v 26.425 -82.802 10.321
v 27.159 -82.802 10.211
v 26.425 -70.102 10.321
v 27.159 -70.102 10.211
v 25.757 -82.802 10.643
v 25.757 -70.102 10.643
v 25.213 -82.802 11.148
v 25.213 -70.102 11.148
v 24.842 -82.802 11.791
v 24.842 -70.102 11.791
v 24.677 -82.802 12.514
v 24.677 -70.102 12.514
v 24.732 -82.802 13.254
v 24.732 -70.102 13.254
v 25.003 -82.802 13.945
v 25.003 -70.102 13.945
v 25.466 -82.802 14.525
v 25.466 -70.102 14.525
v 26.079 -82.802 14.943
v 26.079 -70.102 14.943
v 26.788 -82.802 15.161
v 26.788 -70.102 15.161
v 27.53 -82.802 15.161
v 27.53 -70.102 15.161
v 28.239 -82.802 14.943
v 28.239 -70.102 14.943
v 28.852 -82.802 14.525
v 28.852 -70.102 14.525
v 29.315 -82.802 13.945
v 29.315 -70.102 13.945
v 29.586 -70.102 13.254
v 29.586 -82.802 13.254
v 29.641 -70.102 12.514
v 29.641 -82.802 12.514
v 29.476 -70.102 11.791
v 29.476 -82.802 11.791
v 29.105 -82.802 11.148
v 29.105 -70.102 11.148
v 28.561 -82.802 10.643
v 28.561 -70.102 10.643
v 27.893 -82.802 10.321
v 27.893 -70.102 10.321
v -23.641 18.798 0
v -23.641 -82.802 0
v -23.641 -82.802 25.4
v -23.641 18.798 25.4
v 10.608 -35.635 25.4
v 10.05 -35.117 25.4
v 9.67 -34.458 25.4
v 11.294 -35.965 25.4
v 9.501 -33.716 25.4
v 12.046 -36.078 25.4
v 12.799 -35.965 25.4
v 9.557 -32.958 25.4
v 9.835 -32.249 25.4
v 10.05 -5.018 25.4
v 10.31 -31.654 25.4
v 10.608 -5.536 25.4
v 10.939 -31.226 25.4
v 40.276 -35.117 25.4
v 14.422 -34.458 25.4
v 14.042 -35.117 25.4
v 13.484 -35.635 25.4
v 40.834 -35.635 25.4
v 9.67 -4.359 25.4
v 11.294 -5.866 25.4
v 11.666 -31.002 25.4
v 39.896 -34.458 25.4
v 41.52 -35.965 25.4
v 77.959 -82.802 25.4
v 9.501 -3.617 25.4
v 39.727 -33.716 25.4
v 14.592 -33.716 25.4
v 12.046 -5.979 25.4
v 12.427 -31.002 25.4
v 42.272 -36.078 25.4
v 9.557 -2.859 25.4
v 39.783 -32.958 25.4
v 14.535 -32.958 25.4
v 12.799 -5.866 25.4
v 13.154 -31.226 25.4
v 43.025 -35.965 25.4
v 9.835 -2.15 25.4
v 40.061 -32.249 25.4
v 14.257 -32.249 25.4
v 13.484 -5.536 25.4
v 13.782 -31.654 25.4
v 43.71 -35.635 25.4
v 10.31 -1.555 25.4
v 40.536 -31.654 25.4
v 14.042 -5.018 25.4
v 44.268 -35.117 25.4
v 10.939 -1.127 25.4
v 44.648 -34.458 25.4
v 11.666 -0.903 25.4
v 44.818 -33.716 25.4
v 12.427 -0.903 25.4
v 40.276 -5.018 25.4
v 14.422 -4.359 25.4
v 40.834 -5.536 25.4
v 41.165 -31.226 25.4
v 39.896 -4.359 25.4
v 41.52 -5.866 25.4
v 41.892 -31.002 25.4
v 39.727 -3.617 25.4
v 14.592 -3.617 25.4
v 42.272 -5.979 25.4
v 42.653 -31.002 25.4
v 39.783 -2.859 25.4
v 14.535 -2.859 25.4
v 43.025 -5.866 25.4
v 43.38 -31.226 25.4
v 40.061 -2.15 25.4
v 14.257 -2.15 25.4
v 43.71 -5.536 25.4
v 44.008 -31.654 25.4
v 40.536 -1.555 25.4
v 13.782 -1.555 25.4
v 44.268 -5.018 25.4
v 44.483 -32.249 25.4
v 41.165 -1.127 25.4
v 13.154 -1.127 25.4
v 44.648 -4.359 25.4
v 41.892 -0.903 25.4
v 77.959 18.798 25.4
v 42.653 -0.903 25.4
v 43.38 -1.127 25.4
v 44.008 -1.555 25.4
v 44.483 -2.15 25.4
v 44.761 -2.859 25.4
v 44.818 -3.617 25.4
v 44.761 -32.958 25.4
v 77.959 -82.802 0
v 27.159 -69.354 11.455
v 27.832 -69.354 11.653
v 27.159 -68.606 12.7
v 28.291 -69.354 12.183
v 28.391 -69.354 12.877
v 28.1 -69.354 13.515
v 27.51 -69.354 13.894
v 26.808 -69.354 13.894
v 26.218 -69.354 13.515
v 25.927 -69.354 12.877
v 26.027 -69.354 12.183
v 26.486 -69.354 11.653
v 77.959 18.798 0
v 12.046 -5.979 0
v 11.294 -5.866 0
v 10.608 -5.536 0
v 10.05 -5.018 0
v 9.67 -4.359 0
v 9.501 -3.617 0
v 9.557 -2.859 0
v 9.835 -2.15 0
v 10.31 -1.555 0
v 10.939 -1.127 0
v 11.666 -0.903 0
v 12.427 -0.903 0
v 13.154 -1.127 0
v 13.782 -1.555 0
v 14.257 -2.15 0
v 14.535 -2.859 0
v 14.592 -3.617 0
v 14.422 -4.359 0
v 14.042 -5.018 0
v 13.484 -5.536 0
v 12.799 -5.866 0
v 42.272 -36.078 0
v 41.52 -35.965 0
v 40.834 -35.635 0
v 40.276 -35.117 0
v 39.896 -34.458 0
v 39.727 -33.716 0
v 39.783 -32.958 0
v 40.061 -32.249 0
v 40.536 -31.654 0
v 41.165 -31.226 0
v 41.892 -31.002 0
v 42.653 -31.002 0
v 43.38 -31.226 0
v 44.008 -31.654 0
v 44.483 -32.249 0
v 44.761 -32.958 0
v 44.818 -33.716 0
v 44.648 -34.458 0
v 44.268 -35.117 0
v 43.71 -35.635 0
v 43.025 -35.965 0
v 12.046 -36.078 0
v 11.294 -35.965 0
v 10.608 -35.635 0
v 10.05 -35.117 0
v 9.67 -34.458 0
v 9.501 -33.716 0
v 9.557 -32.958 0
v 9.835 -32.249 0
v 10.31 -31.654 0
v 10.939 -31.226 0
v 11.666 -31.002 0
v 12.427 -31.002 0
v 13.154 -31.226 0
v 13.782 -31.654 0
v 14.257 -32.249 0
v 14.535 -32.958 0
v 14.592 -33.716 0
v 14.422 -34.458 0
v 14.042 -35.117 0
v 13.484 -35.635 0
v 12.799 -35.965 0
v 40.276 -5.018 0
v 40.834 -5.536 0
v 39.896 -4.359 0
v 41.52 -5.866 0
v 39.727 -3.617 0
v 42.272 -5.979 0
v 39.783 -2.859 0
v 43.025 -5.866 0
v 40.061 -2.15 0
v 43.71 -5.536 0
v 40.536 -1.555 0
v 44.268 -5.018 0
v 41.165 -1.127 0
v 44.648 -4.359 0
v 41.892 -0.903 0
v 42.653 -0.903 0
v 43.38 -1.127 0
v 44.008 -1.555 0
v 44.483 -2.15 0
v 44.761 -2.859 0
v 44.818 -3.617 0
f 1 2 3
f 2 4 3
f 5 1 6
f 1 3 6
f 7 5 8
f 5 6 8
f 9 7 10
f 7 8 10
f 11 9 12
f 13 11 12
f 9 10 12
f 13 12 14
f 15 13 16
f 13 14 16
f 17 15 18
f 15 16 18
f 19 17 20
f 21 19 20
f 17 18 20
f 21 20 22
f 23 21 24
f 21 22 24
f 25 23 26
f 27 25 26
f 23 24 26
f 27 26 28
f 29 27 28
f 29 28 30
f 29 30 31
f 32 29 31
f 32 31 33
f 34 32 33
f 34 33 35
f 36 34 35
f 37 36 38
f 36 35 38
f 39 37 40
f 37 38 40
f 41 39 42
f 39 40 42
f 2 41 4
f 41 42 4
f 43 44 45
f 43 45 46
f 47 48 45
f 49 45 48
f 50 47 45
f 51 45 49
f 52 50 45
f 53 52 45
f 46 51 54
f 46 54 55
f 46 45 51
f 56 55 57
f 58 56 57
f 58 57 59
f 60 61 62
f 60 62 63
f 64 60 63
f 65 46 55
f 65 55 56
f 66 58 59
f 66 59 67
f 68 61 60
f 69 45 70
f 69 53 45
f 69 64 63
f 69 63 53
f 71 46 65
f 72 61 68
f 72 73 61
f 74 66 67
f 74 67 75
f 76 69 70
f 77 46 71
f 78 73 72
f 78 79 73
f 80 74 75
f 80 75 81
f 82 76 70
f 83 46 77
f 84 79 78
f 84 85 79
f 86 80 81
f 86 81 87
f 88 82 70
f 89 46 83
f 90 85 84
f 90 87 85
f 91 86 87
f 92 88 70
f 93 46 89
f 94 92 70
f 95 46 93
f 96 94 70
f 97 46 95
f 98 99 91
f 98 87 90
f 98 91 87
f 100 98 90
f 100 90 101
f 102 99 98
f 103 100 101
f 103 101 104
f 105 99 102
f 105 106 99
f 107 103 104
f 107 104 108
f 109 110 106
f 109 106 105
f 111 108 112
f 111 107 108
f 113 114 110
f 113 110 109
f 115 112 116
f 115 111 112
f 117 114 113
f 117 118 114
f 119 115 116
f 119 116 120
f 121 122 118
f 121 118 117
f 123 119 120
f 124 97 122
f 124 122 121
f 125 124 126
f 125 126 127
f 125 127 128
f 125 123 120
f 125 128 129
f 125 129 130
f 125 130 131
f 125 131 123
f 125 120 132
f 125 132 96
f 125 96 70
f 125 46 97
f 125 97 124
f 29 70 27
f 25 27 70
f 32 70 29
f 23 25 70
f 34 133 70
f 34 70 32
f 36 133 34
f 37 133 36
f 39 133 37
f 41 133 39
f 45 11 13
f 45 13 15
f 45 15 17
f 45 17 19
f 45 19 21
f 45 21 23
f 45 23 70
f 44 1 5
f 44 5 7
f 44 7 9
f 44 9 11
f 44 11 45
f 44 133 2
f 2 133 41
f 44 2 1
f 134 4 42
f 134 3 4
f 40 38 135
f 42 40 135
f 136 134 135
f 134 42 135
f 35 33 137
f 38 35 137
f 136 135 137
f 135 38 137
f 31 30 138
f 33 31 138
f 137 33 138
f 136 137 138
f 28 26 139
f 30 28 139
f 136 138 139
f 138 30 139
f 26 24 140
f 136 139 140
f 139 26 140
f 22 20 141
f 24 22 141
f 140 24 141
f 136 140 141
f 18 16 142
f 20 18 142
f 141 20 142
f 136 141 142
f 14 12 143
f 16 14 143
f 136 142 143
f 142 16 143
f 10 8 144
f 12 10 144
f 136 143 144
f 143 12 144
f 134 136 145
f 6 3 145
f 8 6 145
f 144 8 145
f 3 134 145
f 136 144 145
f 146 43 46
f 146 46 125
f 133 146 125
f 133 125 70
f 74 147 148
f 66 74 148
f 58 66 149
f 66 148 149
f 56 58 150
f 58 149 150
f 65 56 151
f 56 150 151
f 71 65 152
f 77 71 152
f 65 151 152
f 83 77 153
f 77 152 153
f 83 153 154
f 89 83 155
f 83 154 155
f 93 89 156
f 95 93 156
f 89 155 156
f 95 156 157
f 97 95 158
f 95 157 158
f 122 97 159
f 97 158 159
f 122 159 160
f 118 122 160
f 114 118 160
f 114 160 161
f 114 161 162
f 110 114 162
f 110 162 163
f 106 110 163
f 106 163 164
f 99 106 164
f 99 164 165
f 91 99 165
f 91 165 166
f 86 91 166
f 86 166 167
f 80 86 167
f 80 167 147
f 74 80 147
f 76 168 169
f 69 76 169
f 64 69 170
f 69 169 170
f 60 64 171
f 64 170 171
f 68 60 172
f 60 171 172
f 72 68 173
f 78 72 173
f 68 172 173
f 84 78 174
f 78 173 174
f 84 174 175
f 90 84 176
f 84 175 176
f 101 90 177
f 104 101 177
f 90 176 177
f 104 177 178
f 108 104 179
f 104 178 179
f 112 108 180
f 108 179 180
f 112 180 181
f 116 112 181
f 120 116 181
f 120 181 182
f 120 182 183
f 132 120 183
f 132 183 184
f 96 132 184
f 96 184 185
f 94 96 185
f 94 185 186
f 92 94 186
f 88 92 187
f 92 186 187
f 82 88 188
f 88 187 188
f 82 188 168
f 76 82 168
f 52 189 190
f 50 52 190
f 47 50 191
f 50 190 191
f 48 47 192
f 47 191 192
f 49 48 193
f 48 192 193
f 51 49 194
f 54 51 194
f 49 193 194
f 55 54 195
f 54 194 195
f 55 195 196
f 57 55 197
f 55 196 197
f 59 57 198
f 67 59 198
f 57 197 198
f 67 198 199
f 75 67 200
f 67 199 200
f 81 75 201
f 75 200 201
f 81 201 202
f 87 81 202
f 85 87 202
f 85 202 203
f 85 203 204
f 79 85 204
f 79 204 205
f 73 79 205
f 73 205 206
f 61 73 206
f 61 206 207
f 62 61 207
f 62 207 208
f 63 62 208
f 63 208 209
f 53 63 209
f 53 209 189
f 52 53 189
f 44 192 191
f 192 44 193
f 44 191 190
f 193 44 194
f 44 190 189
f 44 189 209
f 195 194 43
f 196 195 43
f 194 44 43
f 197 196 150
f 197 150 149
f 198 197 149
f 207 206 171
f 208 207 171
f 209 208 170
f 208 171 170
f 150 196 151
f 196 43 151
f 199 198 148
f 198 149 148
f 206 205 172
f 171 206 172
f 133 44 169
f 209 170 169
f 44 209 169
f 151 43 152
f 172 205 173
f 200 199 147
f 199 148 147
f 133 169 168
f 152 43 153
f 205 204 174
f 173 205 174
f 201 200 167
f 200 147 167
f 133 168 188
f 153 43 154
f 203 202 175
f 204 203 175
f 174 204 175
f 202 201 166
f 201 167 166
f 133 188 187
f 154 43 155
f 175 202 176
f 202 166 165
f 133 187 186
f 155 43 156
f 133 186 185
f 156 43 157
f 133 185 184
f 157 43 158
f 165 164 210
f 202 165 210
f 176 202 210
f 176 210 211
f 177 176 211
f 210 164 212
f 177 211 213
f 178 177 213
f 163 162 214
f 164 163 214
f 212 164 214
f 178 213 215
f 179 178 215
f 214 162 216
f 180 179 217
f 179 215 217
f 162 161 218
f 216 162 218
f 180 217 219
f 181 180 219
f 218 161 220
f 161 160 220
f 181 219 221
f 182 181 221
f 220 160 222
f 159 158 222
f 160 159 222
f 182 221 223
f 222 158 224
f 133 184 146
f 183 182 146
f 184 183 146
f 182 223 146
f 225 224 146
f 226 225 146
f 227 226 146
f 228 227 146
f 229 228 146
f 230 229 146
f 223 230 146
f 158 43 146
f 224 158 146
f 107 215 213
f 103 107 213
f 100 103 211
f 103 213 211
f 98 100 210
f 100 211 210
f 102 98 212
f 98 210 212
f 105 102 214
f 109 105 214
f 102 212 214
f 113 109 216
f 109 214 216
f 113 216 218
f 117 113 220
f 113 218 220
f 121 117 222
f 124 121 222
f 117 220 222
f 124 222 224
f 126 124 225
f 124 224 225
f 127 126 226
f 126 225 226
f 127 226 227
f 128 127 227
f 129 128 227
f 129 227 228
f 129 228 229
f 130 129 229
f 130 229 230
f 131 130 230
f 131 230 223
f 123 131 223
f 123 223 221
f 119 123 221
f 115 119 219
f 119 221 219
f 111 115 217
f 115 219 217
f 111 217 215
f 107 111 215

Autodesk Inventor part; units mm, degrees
ref_plane "YZ Plane" through (0, 0, 0) normal (1, 0, 0) x (0, 1, 0)
ref_plane "XZ Plane" through (0, 0, 0) normal (0, 1, 0) x (-1, 0, 0)
ref_plane "XY Plane" through (0, 0, 0) normal (0, 0, 1) x (1, 0, 0)
sketch "Sketch1" plane through (0, 0, 0) normal (0, 0, 1) x (1, 0, 0)
  line L0 (-23.6409, 18.7983) -> (77.9591, 18.7983)
  line L1 (77.9591, 18.7983) -> (77.9591, -82.8017)
  line L2 (77.9591, -82.8017) -> (-23.6409, -82.8017)
  line L3 (-23.6409, -82.8017) -> (-23.6409, 18.7983)
  point P0 (0, 0)
  dimension "d0" = 101.6
  dimension "d1" = 101.6
extrude "Extrusion1" add sketch "Sketch1" along normal blind 25.4
sketch "Sketch2" plane through (0, 0, 25.4) normal (0, 0, 1) x (1, 0, 0)
  line L0 (-23.6409, 18.7983) -> (77.9591, 18.7983) projected
  line L1 (27.1591, 18.7983) -> (52.8131, 18.7983)
  line L2 (27.1591, 18.7983) -> (1.5051, 18.7983)
  line L3 (1.5051, 18.7983) -> (12.0461, 18.7983)
  line L4 (52.8131, 18.7983) -> (42.2721, 18.7983)
  line L5 (12.0461, 18.7983) -> (12.0461, -3.4267)
  line L6 (12.0461, 18.7983) -> (12.0461, -33.5257)
  line L7 (42.2721, 18.7983) -> (42.2721, -3.4267)
  line L8 (42.2721, -3.4267) -> (42.2721, -33.5257)
  point P0 (0, 0)
  dimension "d4" = 25.654
  dimension "d5" = 25.654
  dimension "d6" = 10.541
  dimension "d7" = 10.541
  dimension "d8" = 22.225
  dimension "d9" = 52.324
hole "Hole1" at (12.0461, -3.4267, 25.4) at (42.2721, -3.4267, 25.4) at (42.2721, -33.5257, 25.4) at (12.0461, -33.5257, 25.4) direction (0, 0, -1) diameter 5.1054 depth 25.4 tip angle 118 clearance for "Socket Head Cap Screw" size "#10" standard "Ansi Unified Screw Threads"
sketch "Sketch3" plane through (-23.6409, -82.8017, 0) normal (0, -1, 0) x (1, 0, 0)
  line L0 (101.6, 25.4) -> (0, 25.4) projected
  line L1 (101.6, 0) -> (0, 0) projected
  line L2 (50.8, 25.4) -> (50.8, 0)
  line L3 (50.8, 12.7) -> (56.2489, 12.7)
  point P0 (23.6409, 0)
hole "Hole2" at (27.1591, -82.8017, 12.7) direction (0, 1, 0) diameter 4.9784 depth 12.7 tip angle 118 thread size "1/4-20 UNC" class "2B" standard "ANSI Unified Screw Threads"
properties part number "mixer mount"
